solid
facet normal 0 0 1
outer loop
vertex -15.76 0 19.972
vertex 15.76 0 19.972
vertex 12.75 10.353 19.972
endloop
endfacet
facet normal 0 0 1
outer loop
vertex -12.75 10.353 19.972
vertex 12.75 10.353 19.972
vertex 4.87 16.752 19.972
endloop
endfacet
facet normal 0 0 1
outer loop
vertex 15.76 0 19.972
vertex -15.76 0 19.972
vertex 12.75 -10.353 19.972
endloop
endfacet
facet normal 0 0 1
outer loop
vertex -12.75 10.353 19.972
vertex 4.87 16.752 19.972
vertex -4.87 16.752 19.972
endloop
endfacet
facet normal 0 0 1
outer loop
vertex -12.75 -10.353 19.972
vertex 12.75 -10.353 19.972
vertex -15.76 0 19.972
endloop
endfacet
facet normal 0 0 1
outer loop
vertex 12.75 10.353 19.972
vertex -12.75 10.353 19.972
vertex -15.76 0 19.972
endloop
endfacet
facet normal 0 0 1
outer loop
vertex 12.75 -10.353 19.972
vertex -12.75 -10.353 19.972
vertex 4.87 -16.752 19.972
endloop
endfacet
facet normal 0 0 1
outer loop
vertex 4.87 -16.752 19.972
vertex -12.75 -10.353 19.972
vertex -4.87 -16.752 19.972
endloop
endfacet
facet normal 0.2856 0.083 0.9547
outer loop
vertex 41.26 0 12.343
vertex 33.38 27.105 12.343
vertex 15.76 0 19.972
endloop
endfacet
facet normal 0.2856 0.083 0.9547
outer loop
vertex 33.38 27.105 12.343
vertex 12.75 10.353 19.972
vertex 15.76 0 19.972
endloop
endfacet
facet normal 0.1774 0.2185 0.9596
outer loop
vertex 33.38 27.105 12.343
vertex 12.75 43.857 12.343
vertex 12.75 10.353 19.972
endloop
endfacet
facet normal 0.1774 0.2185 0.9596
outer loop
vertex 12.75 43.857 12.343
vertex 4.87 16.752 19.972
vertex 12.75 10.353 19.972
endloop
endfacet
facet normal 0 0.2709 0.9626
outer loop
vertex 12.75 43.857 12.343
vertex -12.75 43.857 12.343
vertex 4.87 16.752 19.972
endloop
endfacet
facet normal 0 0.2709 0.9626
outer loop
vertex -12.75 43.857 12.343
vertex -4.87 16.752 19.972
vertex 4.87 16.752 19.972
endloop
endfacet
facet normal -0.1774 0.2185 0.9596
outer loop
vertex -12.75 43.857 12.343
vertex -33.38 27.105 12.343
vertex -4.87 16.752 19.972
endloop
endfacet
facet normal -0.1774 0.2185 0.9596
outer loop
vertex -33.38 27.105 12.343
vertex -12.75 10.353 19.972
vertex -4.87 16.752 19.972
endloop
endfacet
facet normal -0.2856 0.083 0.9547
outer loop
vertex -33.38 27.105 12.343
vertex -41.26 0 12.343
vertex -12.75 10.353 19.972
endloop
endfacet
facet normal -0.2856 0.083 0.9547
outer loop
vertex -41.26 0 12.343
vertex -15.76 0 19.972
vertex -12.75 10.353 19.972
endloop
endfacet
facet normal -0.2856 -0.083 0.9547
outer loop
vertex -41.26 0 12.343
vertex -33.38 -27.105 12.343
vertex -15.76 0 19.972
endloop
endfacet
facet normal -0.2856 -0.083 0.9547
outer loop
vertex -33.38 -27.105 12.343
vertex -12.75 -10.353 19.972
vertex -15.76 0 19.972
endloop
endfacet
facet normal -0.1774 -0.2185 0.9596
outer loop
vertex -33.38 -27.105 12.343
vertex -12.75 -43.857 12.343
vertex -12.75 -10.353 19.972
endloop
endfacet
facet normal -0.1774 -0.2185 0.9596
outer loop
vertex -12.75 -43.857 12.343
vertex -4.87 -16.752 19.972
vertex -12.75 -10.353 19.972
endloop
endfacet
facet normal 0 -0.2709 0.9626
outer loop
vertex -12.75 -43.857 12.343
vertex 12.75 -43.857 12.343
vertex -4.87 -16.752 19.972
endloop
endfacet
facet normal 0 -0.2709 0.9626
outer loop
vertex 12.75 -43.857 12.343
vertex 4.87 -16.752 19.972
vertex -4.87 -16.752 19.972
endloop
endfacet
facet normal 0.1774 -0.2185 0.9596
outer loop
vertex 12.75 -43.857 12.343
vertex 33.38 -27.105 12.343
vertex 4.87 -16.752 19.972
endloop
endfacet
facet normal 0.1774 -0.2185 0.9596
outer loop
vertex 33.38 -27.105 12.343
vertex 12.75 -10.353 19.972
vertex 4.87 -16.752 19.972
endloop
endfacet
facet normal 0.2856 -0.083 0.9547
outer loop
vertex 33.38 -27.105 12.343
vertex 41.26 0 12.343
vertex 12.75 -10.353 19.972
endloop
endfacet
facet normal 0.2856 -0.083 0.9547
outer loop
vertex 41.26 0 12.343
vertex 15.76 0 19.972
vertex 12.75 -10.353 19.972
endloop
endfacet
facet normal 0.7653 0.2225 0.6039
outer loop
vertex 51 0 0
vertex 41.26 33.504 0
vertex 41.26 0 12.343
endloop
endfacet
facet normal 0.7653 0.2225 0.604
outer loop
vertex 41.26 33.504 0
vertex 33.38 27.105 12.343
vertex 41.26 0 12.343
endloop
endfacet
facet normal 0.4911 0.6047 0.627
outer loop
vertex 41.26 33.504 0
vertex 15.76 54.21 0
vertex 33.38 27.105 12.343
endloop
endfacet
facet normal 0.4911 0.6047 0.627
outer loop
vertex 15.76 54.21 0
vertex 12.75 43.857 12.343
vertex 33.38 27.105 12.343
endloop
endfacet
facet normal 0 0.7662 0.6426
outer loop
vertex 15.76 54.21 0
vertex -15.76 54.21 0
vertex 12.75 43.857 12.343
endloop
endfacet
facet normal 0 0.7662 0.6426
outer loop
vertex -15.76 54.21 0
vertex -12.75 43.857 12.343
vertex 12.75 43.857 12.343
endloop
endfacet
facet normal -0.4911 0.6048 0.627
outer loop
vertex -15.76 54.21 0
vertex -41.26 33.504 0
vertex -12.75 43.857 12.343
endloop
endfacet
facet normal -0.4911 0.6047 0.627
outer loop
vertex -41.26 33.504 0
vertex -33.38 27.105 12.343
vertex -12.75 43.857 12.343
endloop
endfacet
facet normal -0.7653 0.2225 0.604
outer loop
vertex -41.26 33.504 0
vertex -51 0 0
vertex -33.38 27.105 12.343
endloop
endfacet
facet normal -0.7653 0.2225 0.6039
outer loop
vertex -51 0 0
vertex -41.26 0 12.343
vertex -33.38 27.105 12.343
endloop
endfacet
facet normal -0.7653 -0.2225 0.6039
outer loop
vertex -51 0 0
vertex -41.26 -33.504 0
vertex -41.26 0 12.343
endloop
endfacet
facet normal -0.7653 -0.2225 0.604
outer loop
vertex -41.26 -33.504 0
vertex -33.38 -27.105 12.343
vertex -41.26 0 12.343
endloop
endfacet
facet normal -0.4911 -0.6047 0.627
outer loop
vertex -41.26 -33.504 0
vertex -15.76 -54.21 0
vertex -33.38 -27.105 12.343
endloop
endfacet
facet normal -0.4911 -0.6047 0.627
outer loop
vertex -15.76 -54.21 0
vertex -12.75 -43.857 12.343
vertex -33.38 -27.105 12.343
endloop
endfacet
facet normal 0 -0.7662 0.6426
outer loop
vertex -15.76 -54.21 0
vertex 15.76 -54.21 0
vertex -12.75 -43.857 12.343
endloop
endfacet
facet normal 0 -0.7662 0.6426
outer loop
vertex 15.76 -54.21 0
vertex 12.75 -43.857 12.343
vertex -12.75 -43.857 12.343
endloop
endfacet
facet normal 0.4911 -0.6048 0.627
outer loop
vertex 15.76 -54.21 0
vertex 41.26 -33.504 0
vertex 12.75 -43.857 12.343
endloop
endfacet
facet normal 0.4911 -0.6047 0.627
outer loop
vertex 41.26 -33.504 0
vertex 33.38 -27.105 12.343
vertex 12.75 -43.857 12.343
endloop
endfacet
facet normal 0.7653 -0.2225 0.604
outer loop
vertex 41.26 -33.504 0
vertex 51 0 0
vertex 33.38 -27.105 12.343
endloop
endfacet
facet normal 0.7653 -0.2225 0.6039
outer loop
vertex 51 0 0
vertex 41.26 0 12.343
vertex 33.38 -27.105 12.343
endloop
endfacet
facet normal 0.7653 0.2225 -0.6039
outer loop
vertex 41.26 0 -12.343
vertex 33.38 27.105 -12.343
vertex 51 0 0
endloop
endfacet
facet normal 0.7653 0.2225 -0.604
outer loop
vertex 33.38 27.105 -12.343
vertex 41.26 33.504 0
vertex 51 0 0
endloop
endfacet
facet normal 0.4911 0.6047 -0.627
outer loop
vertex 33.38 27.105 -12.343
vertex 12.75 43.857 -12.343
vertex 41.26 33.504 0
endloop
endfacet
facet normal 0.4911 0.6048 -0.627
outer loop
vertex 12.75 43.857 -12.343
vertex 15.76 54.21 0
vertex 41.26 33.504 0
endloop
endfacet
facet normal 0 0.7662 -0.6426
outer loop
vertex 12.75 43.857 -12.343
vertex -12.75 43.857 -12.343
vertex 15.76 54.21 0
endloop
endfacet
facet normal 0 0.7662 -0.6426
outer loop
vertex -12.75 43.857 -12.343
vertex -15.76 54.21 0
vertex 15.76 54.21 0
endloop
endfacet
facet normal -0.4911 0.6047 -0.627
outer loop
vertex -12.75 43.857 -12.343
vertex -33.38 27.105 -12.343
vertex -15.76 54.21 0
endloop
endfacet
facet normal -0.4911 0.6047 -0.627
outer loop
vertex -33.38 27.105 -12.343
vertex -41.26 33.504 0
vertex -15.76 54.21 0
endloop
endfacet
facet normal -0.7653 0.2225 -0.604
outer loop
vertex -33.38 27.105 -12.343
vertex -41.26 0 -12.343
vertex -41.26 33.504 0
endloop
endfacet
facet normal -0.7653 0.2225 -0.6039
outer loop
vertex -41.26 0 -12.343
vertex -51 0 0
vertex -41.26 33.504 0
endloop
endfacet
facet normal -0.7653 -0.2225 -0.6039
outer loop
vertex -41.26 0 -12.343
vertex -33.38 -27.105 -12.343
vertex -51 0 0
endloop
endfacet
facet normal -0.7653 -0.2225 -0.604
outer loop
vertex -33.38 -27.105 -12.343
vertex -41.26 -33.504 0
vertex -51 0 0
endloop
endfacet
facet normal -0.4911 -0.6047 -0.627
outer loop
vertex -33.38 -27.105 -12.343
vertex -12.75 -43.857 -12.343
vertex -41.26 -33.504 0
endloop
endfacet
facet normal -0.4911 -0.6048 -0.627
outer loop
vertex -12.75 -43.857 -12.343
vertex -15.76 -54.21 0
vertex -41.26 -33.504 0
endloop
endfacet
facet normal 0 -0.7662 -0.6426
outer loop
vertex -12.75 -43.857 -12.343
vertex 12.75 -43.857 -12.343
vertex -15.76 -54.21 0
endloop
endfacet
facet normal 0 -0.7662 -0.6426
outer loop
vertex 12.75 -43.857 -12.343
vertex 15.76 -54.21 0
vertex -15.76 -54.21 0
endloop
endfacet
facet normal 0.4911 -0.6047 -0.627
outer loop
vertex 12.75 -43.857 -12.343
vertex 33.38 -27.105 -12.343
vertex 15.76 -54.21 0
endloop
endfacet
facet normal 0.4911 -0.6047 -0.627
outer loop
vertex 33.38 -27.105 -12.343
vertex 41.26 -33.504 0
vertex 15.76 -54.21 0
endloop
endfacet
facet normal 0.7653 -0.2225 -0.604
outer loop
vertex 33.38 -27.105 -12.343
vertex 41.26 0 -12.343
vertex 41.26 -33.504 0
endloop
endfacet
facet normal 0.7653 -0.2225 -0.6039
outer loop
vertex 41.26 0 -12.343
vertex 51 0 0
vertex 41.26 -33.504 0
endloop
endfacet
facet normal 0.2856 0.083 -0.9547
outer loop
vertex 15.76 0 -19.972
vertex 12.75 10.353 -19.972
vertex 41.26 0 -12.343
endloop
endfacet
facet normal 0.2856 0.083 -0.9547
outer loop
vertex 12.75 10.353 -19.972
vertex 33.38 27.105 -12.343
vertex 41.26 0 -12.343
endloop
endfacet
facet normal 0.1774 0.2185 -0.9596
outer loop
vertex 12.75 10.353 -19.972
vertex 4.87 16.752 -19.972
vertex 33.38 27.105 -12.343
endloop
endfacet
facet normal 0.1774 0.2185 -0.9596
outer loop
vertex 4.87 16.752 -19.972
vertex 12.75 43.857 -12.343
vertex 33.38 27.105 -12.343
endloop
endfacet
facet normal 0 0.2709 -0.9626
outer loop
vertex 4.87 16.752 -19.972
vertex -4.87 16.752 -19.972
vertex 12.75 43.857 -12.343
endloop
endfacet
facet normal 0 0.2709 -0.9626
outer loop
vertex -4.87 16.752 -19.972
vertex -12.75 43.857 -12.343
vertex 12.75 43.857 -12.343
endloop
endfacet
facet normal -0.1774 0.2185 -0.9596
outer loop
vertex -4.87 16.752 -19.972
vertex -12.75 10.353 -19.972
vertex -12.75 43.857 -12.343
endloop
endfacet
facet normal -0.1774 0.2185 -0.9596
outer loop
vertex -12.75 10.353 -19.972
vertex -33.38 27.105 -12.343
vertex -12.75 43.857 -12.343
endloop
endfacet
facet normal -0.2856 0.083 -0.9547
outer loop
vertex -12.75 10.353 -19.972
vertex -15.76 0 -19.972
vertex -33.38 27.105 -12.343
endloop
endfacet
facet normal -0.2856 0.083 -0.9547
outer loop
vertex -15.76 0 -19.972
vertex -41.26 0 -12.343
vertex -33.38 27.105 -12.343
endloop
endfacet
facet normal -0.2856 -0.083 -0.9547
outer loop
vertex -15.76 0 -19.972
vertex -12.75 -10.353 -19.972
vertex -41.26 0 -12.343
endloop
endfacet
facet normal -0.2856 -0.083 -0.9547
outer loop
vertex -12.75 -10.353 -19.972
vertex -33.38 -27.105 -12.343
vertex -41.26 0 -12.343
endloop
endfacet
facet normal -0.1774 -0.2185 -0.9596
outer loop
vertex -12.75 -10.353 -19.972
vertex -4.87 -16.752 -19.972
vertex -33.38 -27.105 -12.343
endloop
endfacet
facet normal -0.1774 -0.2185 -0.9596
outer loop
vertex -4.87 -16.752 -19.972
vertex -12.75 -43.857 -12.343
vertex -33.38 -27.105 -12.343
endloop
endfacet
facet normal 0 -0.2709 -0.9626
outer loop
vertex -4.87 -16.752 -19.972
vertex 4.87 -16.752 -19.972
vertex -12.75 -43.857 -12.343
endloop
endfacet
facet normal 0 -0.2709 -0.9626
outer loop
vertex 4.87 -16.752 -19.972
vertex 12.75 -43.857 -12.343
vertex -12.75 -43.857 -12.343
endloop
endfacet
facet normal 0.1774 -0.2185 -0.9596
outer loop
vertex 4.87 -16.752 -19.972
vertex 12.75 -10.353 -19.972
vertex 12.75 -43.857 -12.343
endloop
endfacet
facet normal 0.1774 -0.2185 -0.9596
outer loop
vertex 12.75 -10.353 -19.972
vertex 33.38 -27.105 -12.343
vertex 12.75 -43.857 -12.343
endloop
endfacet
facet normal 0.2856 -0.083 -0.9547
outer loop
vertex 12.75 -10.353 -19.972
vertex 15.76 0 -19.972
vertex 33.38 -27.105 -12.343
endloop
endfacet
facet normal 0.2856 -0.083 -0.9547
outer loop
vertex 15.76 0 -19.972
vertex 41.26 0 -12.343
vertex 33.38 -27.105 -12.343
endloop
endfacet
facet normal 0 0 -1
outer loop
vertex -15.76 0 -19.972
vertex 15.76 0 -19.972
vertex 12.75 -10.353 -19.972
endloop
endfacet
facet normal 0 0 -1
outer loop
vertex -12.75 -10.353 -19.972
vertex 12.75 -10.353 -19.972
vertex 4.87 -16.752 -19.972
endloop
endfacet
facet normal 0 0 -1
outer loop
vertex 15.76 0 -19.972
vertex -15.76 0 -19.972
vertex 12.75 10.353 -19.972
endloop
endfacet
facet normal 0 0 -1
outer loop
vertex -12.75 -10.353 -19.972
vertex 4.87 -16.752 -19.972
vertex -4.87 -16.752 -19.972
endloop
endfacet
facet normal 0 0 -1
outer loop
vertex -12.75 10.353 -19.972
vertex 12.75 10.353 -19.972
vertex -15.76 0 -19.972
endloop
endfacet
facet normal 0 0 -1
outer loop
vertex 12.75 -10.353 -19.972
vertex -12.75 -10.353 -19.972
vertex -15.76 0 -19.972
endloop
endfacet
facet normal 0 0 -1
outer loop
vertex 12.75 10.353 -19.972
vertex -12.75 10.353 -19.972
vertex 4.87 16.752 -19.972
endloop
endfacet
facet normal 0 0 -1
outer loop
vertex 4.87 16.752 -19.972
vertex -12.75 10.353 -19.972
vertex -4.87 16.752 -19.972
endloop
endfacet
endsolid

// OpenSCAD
// Generated by SolidPython 1.0.1 on 2020-07-29 00:46:53


scale(v = [17, 19, 7]) {
	sphere(r = 3);
}
/***********************************************
*********      SolidPython code:      **********
************************************************
 
# import packages: SolidPython
from solid import *
from solid.utils import *
from itertools import chain, combinations, permutations


class Resize:

    def __init__(self, scad_file):
        self.scad_file = scad_file
        #self.scad_file = import_scad(scad_file)
        # cone/cylinder param:
        self.r1 = 0
        self.r2 = 0
        self.h = 0
        # rectangular prism param:
        self.w = 0
        self.l = 0
        # ellipse param:
        self.r = 0

    # import OpenScad code (file name corresponds to shape)


    # classify shape + parameters
    def assign(self, param1, param2, param3):
        if self.scad_file == 'cone.scad':
            self.r1 = param1
            self.r2 = param2
            self.h = param3
        elif self.scad_file == 'cylinder.scad':
            self.r1 = param1
            self.r2 = param2
            self.h = param3
        elif self.scad_file == 'rectangularPrism.scad':
            self.h = param1
            self.l = param2
            self.w = param3
        else:
            self.r = param1
            self.h = param2

    # resize parameters
    def iterate(self):
        x = range(3, 20, 2)
        i = 1
        if self.scad_file == 'cone.scad':
            tempList = list(permutations(x, 2))
            for temp in tempList:
                param1 = temp[0]
                param2 = temp[1]
                filepath = 'produced_scad_files/' + 'cone' + str(param1) + '_' + str(param2) + '_' + '.scad'
                scad_render_to_file(cylinder(h=param1, r1=param2, r2=0), filepath)

        elif self.scad_file == 'cylinder.scad':
            tempList = list(permutations(x, 3))
            for temp in tempList:
                param1 = temp[0]
                param2 = temp[1]
                filepath = 'produced_scad_files/' + 'cylinder' + str(param1) + '_' + str(param2) + '_' + '.scad'
                scad_render_to_file(cylinder(h=param1, r1=param2, r2=param2), filepath)

        elif self.scad_file == 'rectangularPrism.scad':
            tempList = list(permutations(x, 3))
            for temp in tempList:
                param1 = temp[0]
                param2 = temp[1]
                param3 = temp[2]
                filepath = 'produced_scad_files/' + 'rectangularPrism' + str(param1) + '_' + str(param2) + '_' + str(
                    param3) + '.scad'
                scad_render_to_file(cube(size=(param1, param2, param3)), filepath)

        elif self.scad_file == 'ellipse.scad':
            tempList = list(permutations(x, 4))
            for temp in tempList:
                param1 = temp[0]
                param2 = temp[1]
                param3 = temp[2]
                param4 = temp[3]
                filepath = 'produced_scad_files/' + 'ellipse' + str(param1) + '_' + str(param2) + '_' + str(param3) + '_' + str(param4) + '.scad'
                scad_render_to_file(scale([param1, param2, param3])(sphere(r=param4)), filepath)

    def render_to_scadfile(self):
        scad_render_to_file(scad, 'example.scad') 
 
************************************************/
